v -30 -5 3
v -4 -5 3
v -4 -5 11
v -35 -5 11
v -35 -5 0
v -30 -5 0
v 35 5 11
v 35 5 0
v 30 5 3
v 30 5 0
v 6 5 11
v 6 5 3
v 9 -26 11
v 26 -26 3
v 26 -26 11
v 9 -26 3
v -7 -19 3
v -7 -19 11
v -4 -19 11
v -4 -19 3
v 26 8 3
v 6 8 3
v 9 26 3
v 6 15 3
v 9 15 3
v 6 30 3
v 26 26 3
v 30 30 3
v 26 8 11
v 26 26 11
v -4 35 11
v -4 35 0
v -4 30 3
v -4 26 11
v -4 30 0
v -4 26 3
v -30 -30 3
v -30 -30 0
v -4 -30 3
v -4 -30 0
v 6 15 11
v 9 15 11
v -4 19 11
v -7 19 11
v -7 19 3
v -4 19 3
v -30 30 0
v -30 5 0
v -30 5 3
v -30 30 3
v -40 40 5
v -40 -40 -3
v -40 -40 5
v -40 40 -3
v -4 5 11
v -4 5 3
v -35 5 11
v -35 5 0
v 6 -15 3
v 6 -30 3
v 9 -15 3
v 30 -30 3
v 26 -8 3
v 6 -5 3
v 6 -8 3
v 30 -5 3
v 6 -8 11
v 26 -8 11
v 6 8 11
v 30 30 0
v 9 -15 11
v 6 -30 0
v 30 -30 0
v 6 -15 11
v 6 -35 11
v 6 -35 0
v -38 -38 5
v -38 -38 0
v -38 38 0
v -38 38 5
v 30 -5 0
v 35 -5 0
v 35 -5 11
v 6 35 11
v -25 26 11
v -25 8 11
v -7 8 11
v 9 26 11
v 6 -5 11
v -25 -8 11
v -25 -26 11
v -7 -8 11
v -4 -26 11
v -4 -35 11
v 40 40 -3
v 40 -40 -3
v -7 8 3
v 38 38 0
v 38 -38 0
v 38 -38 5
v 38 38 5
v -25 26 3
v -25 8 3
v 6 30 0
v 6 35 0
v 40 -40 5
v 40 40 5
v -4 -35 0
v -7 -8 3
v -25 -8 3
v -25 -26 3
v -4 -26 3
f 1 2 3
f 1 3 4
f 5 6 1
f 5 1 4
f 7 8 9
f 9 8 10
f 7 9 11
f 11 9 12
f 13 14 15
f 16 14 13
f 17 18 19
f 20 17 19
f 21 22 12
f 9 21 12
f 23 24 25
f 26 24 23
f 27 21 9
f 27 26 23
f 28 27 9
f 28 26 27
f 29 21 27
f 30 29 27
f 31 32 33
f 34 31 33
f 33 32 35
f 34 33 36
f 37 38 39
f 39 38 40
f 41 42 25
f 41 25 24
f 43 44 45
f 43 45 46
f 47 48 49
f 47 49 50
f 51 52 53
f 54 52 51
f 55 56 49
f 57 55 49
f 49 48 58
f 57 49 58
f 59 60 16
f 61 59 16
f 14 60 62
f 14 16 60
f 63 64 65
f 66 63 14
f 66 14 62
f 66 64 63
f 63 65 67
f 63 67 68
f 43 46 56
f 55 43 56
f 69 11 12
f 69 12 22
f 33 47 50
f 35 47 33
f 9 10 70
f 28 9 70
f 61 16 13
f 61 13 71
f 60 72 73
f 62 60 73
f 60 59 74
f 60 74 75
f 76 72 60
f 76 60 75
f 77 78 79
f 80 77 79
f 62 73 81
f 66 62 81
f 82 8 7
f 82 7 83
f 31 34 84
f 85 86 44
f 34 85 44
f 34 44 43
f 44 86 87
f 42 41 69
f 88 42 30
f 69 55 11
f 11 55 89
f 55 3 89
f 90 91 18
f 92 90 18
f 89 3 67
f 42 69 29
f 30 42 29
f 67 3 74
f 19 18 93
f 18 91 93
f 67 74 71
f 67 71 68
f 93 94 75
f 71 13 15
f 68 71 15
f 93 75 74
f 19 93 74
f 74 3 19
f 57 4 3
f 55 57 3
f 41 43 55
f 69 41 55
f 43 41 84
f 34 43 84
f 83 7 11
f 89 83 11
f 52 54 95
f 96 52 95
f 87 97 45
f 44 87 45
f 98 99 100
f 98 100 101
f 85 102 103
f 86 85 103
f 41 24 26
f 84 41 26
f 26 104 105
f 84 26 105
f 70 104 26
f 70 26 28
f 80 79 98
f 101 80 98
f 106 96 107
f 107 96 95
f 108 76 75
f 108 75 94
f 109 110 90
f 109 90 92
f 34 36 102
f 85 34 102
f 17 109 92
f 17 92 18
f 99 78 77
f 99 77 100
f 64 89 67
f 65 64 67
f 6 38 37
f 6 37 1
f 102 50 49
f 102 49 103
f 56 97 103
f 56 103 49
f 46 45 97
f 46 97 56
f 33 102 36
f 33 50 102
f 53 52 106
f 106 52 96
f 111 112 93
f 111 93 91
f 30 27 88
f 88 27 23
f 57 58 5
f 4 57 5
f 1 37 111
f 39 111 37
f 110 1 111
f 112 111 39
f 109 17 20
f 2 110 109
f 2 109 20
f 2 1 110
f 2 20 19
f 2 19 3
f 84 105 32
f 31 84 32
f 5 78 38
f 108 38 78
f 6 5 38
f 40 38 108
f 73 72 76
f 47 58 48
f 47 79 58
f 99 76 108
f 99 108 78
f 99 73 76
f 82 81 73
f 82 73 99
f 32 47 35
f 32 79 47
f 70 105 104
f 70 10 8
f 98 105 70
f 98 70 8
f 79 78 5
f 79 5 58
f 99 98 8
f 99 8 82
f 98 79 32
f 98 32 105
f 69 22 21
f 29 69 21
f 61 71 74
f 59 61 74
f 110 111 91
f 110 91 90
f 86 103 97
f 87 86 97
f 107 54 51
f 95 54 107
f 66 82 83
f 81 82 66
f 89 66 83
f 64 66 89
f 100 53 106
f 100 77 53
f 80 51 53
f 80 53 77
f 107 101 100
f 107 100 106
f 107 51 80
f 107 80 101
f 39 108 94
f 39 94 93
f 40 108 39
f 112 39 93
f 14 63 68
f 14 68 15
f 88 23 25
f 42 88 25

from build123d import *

# Parameters (mm, degrees)
F1_START = 3
F0_W     = 80
F0_H     = 80
F0_W_2   = 76
F0_H_2   = 76
F1_DEPTH = 51
F0_W_3   = 70
F0_H_3   = 70
F2_DEPTH = 3
F4_W     = 60
F4_H     = 60
F5_DEPTH = 3
F7_DEPTH = 5
F9_DEPTH = 11


# Not quite as in the source:
# - a pattern or mirror of a feature is missing from the dataset's text; its kind, count and spacing are read off the source's solid


with BuildPart() as f1:
    # F0 (on Top) → F1 (new body)
    with BuildSketch(Plane.XY.offset(F1_START)):
        Rectangle(F0_W, F0_H)
        Rectangle(F0_W_2, F0_H_2, mode=Mode.SUBTRACT)
    extrude(amount=F1_DEPTH)


with BuildPart() as f2:
    # F0 (on Top) → F2 (new body)
    with BuildSketch(Plane.XY):
        Rectangle(F0_W, F0_H)
        Rectangle(F0_W_2, F0_H_2, mode=Mode.SUBTRACT)
        Rectangle(F0_W_2, F0_H_2)
        Rectangle(F0_W_3, F0_H_3, mode=Mode.SUBTRACT)
        Rectangle(F0_W_3, F0_H_3)
    extrude(amount=-F2_DEPTH)

    # F4 (on Top) → F5 (join)
    with BuildSketch(Plane.XY):
        Rectangle(F4_W, F4_H)
    extrude(amount=F5_DEPTH)

    # F0 (on Top) → F7 (join)
    with BuildSketch(Plane.XY):
        Rectangle(F0_W, F0_H)
        Rectangle(F0_W_2, F0_H_2, mode=Mode.SUBTRACT)
    extrude(amount=F7_DEPTH)

    # F8 (on Top) → F9 (join)
    with BuildSketch(Plane.XY):
        Polygon((-35, 0), (35, 0), (35, 5), (6, 5), (6, 8), (26, 8), (26, 26), (9, 26), (9, 15), (6, 15), (6, 35), (-4, 35), (-4, 26), (-25, 26), (-25, 8), (-7, 8), (-7, 19), (-4, 19), (-4, 5), (-35, 5), align=None)
    f9 = extrude(amount=F9_DEPTH)

    # F9_copies: F9 across plane
    add(f9.mirror(Plane(origin=(0, 0, 0), x_dir=(0, 0, -1), z_dir=(0, -1, 0))))


solid = f2.part
